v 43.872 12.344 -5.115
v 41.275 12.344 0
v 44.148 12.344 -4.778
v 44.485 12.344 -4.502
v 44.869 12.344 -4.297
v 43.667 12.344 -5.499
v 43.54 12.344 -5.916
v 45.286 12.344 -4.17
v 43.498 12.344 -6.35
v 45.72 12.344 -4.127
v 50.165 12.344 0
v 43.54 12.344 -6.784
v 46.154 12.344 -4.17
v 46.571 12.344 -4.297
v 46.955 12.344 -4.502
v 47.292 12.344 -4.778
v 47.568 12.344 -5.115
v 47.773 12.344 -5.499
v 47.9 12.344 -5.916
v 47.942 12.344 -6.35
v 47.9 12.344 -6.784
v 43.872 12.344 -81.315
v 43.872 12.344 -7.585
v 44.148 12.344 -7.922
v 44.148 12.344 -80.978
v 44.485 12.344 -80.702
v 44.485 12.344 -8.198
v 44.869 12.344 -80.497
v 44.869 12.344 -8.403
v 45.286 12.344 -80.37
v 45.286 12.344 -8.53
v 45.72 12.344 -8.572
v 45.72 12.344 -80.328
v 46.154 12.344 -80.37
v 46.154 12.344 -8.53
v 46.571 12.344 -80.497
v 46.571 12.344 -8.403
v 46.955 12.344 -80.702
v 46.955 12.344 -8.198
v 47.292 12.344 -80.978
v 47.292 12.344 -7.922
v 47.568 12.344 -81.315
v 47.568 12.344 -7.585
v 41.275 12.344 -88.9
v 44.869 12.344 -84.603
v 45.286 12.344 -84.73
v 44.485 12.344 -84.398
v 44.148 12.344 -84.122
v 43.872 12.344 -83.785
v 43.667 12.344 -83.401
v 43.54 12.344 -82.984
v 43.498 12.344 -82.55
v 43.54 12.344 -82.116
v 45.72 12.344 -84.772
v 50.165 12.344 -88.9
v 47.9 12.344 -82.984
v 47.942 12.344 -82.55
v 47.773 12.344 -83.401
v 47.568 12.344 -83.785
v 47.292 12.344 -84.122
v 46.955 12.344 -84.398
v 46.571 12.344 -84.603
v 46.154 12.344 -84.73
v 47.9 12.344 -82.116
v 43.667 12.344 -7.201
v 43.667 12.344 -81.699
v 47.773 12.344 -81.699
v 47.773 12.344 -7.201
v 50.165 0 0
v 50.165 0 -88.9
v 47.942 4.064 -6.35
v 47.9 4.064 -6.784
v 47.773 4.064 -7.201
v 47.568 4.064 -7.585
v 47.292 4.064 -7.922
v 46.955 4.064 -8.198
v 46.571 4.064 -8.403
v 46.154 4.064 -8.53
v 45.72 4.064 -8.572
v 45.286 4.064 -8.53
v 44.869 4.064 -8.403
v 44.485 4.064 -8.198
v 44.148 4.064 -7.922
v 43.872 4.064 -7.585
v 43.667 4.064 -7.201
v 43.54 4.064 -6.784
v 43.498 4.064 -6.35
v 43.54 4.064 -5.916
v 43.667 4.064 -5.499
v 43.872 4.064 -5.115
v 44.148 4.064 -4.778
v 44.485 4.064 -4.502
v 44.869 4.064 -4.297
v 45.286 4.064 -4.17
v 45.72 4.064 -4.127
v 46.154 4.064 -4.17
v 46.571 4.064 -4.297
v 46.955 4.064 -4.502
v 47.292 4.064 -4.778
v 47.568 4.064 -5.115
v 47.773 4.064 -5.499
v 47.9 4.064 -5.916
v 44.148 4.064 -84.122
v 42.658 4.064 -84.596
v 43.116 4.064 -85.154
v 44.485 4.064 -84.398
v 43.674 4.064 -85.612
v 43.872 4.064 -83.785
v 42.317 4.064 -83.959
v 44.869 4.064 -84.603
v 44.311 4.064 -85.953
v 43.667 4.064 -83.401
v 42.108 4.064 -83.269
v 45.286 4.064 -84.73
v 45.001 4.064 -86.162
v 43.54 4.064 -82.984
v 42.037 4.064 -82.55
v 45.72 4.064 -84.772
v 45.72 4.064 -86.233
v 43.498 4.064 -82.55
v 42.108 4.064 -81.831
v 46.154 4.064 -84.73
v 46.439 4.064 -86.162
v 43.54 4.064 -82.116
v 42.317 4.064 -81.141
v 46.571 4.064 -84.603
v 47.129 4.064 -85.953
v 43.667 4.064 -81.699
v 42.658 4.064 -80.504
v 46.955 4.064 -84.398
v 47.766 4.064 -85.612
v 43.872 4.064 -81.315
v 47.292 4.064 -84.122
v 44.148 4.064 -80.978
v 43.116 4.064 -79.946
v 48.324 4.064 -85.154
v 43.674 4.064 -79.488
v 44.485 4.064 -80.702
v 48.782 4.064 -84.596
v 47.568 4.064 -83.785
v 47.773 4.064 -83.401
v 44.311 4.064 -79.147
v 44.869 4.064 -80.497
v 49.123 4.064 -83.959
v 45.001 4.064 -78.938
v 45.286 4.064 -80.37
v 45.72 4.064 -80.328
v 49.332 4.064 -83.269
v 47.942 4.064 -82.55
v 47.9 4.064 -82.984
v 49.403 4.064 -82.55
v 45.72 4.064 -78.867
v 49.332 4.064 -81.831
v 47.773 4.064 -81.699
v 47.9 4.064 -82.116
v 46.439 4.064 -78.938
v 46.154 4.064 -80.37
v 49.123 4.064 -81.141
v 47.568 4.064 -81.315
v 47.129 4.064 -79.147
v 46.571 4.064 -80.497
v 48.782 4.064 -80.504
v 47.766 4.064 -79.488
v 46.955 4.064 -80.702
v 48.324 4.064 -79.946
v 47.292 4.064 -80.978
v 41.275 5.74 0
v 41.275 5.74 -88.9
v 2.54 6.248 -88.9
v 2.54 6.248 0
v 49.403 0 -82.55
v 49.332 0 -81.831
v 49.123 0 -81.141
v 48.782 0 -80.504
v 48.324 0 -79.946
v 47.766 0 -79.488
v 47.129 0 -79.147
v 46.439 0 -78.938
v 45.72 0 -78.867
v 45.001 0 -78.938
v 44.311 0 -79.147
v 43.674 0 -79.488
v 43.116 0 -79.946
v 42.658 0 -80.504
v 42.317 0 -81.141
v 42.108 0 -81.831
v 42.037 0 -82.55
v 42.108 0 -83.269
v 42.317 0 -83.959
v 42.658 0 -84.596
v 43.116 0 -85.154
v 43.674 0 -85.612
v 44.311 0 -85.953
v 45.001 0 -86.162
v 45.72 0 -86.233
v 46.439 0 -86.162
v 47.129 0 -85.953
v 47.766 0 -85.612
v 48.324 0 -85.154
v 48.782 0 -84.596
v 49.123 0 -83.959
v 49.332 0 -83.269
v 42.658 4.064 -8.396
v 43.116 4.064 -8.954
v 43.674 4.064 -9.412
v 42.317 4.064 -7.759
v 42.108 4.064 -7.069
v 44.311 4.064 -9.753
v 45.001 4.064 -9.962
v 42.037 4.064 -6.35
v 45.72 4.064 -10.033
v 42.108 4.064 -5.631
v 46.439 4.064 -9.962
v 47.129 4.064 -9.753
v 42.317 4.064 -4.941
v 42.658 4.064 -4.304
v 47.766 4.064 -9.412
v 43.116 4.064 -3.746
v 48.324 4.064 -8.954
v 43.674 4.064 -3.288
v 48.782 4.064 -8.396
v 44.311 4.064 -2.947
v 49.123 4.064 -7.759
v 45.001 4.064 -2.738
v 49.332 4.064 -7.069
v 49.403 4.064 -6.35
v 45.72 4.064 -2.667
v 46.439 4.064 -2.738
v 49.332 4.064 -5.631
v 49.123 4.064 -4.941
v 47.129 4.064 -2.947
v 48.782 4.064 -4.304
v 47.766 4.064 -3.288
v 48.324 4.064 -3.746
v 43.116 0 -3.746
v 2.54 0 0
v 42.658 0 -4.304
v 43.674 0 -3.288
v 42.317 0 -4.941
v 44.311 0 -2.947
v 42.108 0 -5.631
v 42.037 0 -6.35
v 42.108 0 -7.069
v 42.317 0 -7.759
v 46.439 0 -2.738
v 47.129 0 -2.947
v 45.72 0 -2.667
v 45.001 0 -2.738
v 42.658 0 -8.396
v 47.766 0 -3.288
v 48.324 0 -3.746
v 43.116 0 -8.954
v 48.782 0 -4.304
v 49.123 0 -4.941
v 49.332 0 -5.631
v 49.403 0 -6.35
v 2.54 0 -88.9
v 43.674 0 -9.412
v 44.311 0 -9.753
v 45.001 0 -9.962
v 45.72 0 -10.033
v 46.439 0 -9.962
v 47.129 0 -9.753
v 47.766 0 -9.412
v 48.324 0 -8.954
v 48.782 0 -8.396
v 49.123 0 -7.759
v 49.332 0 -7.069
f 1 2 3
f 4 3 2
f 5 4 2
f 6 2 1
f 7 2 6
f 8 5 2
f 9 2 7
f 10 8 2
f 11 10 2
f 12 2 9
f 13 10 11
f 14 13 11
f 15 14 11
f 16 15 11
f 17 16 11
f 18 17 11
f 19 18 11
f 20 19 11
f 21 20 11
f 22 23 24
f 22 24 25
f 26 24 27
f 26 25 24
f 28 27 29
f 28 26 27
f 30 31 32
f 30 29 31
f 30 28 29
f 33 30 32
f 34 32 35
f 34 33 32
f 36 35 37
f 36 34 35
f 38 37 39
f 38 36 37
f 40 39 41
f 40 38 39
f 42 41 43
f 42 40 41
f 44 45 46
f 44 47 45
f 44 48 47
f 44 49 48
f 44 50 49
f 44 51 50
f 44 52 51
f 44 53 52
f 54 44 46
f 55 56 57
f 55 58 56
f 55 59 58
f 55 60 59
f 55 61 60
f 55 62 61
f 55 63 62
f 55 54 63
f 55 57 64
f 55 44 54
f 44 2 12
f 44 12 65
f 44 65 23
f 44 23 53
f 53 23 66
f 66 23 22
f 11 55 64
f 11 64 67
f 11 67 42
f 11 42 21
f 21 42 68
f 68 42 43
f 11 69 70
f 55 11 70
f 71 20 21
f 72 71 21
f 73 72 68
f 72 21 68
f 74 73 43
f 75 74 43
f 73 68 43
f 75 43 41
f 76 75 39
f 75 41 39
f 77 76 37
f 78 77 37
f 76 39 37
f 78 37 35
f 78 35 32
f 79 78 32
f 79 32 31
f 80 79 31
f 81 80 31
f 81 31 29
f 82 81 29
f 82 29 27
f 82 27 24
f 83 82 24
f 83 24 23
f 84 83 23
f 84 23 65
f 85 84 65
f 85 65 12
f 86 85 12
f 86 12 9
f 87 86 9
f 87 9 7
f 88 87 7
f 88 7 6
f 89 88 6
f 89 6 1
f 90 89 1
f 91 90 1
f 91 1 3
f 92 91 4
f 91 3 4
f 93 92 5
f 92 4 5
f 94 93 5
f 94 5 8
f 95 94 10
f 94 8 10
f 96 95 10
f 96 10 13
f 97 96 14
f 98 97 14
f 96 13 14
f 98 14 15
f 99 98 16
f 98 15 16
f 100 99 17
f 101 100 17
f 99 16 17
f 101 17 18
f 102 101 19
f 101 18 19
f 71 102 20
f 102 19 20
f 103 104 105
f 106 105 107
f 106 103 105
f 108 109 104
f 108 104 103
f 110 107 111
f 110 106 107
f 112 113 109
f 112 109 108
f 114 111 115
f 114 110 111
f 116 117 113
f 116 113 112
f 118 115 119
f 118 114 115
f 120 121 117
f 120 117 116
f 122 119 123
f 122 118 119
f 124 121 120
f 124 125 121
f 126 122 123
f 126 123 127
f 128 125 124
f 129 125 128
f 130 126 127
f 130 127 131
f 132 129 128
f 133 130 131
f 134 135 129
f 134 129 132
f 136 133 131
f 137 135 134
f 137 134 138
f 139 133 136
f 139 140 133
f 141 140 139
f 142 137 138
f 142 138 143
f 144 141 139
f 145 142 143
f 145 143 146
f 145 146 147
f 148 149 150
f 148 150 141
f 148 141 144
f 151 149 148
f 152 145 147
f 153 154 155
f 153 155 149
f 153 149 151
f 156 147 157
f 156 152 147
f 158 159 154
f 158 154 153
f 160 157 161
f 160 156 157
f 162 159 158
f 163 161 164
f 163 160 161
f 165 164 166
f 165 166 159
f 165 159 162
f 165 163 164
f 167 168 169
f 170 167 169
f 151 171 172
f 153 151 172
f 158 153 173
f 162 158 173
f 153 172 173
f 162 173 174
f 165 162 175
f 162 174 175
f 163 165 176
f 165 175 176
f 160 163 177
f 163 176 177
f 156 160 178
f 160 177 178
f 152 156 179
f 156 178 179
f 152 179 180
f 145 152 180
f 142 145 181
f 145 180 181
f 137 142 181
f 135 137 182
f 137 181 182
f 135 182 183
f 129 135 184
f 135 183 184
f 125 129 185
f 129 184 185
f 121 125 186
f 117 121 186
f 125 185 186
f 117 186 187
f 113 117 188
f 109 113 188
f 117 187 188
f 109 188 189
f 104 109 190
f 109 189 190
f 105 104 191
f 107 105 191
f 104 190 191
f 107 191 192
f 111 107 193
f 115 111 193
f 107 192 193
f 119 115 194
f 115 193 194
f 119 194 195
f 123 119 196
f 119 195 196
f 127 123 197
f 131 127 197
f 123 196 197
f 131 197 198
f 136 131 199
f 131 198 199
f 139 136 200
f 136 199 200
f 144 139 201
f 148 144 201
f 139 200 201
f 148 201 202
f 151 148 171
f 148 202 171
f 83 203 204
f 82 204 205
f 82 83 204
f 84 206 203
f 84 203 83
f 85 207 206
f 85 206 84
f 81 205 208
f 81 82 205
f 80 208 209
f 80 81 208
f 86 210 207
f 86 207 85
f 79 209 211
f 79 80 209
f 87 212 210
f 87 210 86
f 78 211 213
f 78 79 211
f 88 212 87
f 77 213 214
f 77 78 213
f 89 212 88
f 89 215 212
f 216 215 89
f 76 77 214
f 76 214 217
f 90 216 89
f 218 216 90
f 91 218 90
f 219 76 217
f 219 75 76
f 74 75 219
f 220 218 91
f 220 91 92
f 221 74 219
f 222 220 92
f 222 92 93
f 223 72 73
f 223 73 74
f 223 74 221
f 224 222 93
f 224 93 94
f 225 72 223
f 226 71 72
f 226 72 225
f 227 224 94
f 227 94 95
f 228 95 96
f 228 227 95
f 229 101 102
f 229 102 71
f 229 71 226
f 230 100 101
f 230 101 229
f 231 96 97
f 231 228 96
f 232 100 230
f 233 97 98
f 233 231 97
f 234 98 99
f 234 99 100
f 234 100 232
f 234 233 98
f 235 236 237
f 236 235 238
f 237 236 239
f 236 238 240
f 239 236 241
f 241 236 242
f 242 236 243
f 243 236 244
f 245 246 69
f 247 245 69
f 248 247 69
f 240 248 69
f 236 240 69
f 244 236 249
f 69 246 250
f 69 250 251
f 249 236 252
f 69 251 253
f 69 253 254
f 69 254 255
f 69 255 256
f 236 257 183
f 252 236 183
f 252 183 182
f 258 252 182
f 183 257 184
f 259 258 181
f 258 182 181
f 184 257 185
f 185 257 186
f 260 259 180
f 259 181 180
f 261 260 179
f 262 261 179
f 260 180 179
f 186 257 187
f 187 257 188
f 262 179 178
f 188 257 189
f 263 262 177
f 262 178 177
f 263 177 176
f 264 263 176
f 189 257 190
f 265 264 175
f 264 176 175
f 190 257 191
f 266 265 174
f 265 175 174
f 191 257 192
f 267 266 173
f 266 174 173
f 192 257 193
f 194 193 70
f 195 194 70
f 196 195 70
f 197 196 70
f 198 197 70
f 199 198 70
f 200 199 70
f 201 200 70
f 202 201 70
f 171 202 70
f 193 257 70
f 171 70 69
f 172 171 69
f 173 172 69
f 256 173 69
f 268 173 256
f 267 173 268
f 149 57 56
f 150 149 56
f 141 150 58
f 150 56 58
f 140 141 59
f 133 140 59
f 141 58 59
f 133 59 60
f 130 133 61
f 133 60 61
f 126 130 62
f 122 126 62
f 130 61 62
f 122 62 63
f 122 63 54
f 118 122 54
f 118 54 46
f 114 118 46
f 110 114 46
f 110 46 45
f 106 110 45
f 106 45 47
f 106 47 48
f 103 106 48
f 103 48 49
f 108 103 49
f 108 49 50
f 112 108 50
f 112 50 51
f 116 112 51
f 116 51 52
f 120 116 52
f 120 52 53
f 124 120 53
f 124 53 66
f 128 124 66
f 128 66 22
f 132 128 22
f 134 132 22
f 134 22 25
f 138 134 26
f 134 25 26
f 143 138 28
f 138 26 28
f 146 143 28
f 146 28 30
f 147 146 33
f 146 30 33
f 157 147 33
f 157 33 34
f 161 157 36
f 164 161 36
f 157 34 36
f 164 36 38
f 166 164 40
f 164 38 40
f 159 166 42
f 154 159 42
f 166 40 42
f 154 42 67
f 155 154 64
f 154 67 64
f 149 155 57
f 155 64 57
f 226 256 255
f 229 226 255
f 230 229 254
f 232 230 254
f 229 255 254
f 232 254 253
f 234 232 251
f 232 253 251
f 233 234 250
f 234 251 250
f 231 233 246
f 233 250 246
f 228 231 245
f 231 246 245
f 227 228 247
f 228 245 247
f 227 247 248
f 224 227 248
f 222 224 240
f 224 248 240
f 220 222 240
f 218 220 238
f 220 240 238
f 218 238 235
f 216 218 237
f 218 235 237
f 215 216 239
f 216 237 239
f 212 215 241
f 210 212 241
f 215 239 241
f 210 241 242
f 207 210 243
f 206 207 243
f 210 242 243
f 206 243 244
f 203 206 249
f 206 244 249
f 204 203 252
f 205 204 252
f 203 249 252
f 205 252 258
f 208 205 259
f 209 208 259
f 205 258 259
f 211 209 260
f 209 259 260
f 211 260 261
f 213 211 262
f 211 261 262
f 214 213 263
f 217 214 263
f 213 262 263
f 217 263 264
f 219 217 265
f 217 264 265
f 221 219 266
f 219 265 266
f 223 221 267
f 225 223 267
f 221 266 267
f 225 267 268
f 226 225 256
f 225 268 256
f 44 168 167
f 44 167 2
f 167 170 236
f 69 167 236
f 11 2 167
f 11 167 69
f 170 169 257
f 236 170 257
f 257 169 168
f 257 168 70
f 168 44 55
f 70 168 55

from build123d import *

# Parameters (mm, degrees)
SKETCH1_W               = 41.275
SKETCH1_H               = 88.9
BOSS_EXTRUDE1_DEPTH     = 5.9944
SKETCH1_5_W             = 8.89
SKETCH1_5_H             = 88.9
BOSS_EXTRUDE2_DEPTH     = 12.3444
SKETCH3_R               = 2.2225
CUT_EXTRUDE1_DEPTH      = 1
CUT_EXTRUDE1_DEPTH_BACK = 13.3444
SKETCH4_R               = 3.683
CUT_EXTRUDE2_DEPTH      = 4.064
SKETCH5_W               = 2.54
SKETCH5_H               = 88.9
CUT_EXTRUDE3_DEPTH      = 7.35
CUT_EXTRUDE3_DEPTH_BACK = 6.9944
BOSS_EXTRUDE3_DEPTH     = 88.9
CUT_EXTRUDE4_DEPTH      = 88.9


with BuildPart() as part:
    # Sketch1 → Boss-Extrude1 (new body)
    with BuildSketch(Plane(origin=(0, 0, 0), x_dir=(1, 0, 0), z_dir=(0, 1, 0))):
        with Locations((20.6375, 44.45)):
            Rectangle(SKETCH1_W, SKETCH1_H)
    extrude(amount=BOSS_EXTRUDE1_DEPTH)

    # Sketch1<5> → Boss-Extrude2 (add)
    with BuildSketch(Plane(origin=(0, 0, 0), x_dir=(1, 0, 0), z_dir=(0, 1, 0))):
        with Locations((45.72, 44.45)):
            Rectangle(SKETCH1_5_W, SKETCH1_5_H)
    extrude(amount=BOSS_EXTRUDE2_DEPTH)

    # Sketch3 → Cut-Extrude1 (cut, two sides)
    with BuildSketch(Plane(origin=(0, 12.3444, 0), x_dir=(1, 0, 0), z_dir=(0, 1, 0))) as cut_extrude1_sk:
        with Locations((45.72, 82.55)):
            Circle(SKETCH3_R)
        with Locations((45.72, 6.35)):
            Circle(SKETCH3_R)
    extrude(amount=CUT_EXTRUDE1_DEPTH, mode=Mode.SUBTRACT)
    extrude(cut_extrude1_sk.sketch, amount=-CUT_EXTRUDE1_DEPTH_BACK, mode=Mode.SUBTRACT)

    # Sketch4 → Cut-Extrude2 (cut)
    with BuildSketch(Plane.XZ):
        with Locations((45.72, -6.35)):
            Circle(SKETCH4_R)
        with Locations((45.72, -82.55)):
            Circle(SKETCH4_R)
    extrude(amount=-CUT_EXTRUDE2_DEPTH, mode=Mode.SUBTRACT)

    # Sketch5 → Cut-Extrude3 (cut, two sides)
    with BuildSketch(Plane(origin=(0, 5.9944, 0), x_dir=(1, 0, 0), z_dir=(0, 1, 0))) as cut_extrude3_sk:
        with Locations((1.27, 44.45)):
            Rectangle(SKETCH5_W, SKETCH5_H)
    extrude(amount=CUT_EXTRUDE3_DEPTH, mode=Mode.SUBTRACT)
    extrude(cut_extrude3_sk.sketch, amount=-CUT_EXTRUDE3_DEPTH_BACK, mode=Mode.SUBTRACT)

    # Sketch6 → Boss-Extrude3 (add)
    with BuildSketch(Plane.XY):
        Polygon((2.54, 6.2484), (2.54, 5.9944), (21.9075, 5.9944), align=None)
    extrude(amount=-BOSS_EXTRUDE3_DEPTH)

    # Sketch6<3> → Cut-Extrude4 (cut)
    with BuildSketch(Plane.XY):
        Polygon((41.275, 5.9944), (21.9075, 5.9944), (41.275, 5.7404), align=None)
    extrude(amount=-CUT_EXTRUDE4_DEPTH, mode=Mode.SUBTRACT)


solid = part.part
